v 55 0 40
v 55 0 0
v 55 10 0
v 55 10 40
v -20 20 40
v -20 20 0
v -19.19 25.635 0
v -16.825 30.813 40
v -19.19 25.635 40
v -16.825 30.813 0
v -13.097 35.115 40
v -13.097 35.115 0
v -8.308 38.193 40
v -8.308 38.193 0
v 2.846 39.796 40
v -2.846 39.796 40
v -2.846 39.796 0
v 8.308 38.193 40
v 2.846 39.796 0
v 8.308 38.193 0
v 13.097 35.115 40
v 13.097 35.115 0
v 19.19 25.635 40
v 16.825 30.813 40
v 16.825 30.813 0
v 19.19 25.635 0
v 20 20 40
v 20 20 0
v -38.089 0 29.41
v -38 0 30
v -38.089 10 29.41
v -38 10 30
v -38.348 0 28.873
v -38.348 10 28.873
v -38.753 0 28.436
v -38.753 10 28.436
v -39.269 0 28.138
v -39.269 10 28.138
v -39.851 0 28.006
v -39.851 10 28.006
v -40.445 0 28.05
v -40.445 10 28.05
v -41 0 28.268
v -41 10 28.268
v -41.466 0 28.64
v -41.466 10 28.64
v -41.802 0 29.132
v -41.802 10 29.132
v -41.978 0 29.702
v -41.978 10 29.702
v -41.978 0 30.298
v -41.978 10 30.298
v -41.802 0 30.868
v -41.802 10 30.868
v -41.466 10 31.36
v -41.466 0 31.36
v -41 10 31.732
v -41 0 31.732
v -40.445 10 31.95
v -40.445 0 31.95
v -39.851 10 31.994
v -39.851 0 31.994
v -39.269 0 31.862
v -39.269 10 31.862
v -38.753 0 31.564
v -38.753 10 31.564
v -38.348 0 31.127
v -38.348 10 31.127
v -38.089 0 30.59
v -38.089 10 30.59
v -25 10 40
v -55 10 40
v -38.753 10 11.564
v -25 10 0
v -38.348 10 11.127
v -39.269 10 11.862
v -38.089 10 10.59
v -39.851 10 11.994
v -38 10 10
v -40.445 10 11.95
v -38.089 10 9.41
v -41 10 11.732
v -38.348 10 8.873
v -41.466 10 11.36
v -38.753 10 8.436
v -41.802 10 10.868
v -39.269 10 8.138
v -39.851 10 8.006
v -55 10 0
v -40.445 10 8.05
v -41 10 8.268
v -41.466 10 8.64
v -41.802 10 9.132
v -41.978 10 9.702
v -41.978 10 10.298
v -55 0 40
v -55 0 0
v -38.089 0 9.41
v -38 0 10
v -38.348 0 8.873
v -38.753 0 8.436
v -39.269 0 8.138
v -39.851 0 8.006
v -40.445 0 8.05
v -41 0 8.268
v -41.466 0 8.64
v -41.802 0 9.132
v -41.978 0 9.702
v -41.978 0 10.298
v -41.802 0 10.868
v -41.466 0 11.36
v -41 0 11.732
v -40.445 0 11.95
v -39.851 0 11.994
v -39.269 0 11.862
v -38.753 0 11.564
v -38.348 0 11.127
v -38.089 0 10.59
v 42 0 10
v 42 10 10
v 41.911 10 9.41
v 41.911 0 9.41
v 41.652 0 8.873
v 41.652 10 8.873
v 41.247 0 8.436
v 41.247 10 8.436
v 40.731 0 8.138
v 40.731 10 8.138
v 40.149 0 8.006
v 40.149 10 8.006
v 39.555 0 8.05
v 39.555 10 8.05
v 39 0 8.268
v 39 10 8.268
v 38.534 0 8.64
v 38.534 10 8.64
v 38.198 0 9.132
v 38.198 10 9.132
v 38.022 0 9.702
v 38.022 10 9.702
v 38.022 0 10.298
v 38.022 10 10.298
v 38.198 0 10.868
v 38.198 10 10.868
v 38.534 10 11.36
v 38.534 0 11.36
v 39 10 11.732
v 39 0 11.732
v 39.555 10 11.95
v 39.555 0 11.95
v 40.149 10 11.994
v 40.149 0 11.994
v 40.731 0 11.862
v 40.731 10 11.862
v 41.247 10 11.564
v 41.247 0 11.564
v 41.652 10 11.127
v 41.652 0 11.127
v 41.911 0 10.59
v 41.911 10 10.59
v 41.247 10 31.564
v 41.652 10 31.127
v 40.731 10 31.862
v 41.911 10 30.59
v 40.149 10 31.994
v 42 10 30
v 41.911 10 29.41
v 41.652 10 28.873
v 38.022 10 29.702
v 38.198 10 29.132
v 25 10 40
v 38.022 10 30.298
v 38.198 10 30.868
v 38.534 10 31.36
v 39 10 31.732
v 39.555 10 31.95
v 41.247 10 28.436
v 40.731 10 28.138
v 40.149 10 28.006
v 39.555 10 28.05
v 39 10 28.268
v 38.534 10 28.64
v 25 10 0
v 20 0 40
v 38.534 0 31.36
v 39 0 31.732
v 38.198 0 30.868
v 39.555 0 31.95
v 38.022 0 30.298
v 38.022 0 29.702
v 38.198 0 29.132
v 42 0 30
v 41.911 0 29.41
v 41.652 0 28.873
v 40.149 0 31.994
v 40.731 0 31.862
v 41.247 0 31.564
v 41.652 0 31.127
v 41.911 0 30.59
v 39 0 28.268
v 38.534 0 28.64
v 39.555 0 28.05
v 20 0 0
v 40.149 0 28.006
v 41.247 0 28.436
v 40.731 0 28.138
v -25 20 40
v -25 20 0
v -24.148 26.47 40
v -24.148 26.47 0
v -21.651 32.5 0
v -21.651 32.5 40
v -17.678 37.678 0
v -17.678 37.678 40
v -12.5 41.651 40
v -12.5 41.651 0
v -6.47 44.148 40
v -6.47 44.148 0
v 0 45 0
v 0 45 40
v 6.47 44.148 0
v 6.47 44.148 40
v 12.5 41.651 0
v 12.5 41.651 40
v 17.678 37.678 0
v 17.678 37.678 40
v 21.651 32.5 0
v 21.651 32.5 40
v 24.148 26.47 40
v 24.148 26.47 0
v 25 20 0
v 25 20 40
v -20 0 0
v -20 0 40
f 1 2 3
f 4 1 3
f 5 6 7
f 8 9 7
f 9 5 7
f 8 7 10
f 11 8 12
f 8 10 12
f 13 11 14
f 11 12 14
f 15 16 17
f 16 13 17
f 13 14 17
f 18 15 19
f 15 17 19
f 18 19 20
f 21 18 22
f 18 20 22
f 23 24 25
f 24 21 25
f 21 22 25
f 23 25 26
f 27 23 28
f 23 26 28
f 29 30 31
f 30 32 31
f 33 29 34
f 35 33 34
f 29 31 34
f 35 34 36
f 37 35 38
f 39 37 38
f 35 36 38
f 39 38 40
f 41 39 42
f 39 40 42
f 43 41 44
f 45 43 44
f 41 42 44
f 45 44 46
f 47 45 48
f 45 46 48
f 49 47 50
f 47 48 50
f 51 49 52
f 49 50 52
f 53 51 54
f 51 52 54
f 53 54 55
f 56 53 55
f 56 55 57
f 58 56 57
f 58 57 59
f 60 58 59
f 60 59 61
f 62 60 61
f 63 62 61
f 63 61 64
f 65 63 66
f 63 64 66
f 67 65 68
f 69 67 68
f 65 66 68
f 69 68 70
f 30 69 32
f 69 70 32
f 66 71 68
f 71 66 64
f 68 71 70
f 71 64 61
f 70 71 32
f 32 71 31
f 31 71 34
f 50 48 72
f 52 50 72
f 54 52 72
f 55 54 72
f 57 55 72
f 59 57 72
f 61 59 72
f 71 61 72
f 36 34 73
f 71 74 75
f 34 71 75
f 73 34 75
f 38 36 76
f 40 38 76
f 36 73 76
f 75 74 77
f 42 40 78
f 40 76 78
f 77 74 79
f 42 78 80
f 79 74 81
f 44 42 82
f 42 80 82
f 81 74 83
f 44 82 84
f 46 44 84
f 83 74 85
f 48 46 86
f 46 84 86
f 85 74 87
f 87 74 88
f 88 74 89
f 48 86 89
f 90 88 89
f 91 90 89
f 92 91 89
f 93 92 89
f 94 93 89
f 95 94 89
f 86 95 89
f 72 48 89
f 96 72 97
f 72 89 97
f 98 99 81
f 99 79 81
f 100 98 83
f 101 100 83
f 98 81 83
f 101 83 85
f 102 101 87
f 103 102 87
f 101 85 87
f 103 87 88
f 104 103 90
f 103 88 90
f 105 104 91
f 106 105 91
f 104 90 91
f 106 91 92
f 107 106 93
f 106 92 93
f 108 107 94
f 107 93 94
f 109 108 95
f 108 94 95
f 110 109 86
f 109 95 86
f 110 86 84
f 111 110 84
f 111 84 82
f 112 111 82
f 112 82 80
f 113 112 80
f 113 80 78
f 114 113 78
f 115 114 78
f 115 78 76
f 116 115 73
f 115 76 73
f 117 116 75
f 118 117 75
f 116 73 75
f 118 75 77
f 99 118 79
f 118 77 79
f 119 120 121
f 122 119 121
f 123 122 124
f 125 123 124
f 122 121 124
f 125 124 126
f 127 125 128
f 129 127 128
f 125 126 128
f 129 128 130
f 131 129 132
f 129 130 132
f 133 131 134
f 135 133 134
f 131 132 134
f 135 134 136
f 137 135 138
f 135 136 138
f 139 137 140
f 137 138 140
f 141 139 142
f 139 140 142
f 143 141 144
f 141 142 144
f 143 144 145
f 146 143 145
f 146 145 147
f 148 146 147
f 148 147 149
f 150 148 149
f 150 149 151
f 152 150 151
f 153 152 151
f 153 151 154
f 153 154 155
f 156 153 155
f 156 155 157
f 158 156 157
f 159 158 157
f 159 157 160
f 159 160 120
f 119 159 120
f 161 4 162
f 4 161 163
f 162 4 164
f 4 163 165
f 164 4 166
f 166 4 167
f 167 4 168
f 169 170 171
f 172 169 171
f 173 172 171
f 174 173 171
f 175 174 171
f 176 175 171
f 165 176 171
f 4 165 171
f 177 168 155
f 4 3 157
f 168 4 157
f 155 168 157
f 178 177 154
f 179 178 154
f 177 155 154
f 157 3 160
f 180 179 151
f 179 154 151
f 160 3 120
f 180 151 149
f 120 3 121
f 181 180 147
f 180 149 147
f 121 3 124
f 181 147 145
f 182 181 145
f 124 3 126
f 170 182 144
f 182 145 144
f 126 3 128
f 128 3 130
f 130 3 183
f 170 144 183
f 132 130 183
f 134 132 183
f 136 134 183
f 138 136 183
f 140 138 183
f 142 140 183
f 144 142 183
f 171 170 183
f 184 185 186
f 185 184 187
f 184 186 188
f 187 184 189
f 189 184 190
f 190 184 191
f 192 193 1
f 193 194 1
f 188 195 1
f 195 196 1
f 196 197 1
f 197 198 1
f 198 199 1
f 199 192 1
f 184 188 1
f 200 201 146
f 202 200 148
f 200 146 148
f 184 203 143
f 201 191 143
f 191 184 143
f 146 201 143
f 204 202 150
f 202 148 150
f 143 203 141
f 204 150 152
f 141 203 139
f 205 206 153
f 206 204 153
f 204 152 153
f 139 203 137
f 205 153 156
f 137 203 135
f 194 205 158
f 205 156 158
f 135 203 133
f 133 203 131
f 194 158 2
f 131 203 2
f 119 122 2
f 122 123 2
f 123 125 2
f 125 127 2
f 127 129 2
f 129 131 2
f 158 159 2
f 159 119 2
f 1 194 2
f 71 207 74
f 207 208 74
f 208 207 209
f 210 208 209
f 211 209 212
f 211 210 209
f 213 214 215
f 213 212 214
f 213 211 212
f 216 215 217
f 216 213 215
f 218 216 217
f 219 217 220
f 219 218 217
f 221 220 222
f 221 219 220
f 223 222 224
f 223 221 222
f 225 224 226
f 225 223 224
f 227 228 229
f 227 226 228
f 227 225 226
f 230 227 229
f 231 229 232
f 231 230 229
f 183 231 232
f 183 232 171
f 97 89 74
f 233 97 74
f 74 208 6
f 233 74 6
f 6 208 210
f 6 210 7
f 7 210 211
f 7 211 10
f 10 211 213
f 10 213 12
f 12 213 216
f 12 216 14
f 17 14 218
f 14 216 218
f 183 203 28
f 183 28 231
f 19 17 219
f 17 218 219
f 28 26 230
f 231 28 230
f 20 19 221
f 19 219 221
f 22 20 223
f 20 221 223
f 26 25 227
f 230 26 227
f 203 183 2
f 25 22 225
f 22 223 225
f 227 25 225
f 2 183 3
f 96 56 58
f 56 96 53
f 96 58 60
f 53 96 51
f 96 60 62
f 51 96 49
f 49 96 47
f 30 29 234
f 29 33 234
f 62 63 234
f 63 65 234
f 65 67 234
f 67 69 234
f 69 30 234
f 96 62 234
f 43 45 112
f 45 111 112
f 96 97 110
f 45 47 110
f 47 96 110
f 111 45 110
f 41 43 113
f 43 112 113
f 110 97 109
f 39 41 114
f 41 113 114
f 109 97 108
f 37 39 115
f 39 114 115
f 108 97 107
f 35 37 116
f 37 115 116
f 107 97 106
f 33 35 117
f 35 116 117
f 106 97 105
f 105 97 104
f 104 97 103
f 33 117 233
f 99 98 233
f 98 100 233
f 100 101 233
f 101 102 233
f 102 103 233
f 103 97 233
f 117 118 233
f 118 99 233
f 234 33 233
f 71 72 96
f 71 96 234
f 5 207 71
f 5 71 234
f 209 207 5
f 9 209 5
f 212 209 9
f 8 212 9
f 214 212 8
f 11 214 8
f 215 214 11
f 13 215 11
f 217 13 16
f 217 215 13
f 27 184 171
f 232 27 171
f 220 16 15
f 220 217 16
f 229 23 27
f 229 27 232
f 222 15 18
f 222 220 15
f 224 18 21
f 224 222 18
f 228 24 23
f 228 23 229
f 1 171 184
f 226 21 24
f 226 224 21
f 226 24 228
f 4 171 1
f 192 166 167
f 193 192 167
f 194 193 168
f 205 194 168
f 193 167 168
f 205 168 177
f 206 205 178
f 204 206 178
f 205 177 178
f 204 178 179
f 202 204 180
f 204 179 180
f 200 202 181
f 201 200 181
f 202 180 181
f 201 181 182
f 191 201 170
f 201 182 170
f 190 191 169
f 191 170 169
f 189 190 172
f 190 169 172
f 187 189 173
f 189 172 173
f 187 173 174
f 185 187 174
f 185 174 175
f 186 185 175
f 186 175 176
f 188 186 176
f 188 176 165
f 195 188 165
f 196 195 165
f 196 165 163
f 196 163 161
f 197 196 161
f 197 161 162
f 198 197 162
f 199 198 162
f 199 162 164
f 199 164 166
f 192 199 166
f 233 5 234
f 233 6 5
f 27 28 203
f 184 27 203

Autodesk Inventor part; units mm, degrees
ref_plane "YZ Plane" through (0, 0, 0) normal (1, 0, 0) x (0, 1, 0)
ref_plane "XZ Plane" through (0, 0, 0) normal (0, 1, 0) x (-1, 0, 0)
ref_plane "XY Plane" through (0, 0, 0) normal (0, 0, 1) x (1, 0, 0)
sketch "Sketch1" plane through (0, 0, 0) normal (0, 0, 1) x (1, 0, 0)
  arc A0 (20, 20) -> (-20, 20) centre (0, 20) ccw
  line L0 (55, 0) -> (55, 10)
  line L1 (-55, 10) -> (-55, 0)
  line L2 (55, 10) -> (25, 10)
  line L3 (-25, 10) -> (-55, 10)
  line L4 (20, 20) -> (20, 0)
  line L5 (-20, 20) -> (-20, 0)
  line L6 (25, 20) -> (25, 10)
  line L7 (-25, 20) -> (-25, 10)
  arc A1 (25, 20) -> (-25, 20) centre (0, 20) ccw
  line L8 (-55, 0) -> (-20, 0)
  line L9 (20, 0) -> (55, 0)
  point P0 (0, 0)
  dimension "d1" = 10
  dimension "d4" = 55
  dimension "d5" = 30
  dimension "d6" = 30
  dimension "d7" = 55
extrude "Extrusion1" add sketch "Sketch1" along normal blind 40
sketch "Sketch2" plane through (25, 10, 0) normal (0, 1, 0) x (1, 0, 0)
  point P0 (-25, 0)
sketch "Sketch3" plane through (25, 10, 0) normal (0, 1, 0) x (1, 0, 0)
  line L0 (30, 0) -> (0, 0) construction
  line L1 (15, 0) -> (15, -40) construction
  line L2 (30, -40) -> (0, -40) construction
  line L3 (30, 0) -> (30, -40) construction
  line L4 (30, -20) -> (-80, -20) construction
  line L5 (-80, 0) -> (-80, -40) construction
  line L6 (-50, 0) -> (-80, 0) construction
  line L7 (-65, 0) -> (-65, -40) construction
  line L8 (-50, -40) -> (-80, -40) construction
  line L9 (-80, -10) -> (30, -10) construction
  line L10 (-80, -30) -> (30, -30) construction
  circle A0 centre (15, -10) radius 2
  circle A1 centre (15, -30) radius 2
  circle A2 centre (-65, -10) radius 2
  circle A3 centre (-65, -30) radius 2
  point P0 (-25, 0)
  dimension "d8" = 4
  dimension "d9" = 4
  dimension "d10" = 4
  dimension "d11" = 4
extrude "Extrusion2" cut sketch "Sketch3" against normal blind 10
thread "Thread1" size "M4x0.7" class "6H" standard "ISO Metric profile" length 150
thread "Thread2" size "M4x0.7" class "6H" standard "ISO Metric profile" length 150
thread "Thread3" size "M4x0.7" class "6H" standard "ISO Metric profile" length 150
thread "Thread4" size "M4x0.7" class "6H" standard "ISO Metric profile" length 150
properties part number "U-bracket"
